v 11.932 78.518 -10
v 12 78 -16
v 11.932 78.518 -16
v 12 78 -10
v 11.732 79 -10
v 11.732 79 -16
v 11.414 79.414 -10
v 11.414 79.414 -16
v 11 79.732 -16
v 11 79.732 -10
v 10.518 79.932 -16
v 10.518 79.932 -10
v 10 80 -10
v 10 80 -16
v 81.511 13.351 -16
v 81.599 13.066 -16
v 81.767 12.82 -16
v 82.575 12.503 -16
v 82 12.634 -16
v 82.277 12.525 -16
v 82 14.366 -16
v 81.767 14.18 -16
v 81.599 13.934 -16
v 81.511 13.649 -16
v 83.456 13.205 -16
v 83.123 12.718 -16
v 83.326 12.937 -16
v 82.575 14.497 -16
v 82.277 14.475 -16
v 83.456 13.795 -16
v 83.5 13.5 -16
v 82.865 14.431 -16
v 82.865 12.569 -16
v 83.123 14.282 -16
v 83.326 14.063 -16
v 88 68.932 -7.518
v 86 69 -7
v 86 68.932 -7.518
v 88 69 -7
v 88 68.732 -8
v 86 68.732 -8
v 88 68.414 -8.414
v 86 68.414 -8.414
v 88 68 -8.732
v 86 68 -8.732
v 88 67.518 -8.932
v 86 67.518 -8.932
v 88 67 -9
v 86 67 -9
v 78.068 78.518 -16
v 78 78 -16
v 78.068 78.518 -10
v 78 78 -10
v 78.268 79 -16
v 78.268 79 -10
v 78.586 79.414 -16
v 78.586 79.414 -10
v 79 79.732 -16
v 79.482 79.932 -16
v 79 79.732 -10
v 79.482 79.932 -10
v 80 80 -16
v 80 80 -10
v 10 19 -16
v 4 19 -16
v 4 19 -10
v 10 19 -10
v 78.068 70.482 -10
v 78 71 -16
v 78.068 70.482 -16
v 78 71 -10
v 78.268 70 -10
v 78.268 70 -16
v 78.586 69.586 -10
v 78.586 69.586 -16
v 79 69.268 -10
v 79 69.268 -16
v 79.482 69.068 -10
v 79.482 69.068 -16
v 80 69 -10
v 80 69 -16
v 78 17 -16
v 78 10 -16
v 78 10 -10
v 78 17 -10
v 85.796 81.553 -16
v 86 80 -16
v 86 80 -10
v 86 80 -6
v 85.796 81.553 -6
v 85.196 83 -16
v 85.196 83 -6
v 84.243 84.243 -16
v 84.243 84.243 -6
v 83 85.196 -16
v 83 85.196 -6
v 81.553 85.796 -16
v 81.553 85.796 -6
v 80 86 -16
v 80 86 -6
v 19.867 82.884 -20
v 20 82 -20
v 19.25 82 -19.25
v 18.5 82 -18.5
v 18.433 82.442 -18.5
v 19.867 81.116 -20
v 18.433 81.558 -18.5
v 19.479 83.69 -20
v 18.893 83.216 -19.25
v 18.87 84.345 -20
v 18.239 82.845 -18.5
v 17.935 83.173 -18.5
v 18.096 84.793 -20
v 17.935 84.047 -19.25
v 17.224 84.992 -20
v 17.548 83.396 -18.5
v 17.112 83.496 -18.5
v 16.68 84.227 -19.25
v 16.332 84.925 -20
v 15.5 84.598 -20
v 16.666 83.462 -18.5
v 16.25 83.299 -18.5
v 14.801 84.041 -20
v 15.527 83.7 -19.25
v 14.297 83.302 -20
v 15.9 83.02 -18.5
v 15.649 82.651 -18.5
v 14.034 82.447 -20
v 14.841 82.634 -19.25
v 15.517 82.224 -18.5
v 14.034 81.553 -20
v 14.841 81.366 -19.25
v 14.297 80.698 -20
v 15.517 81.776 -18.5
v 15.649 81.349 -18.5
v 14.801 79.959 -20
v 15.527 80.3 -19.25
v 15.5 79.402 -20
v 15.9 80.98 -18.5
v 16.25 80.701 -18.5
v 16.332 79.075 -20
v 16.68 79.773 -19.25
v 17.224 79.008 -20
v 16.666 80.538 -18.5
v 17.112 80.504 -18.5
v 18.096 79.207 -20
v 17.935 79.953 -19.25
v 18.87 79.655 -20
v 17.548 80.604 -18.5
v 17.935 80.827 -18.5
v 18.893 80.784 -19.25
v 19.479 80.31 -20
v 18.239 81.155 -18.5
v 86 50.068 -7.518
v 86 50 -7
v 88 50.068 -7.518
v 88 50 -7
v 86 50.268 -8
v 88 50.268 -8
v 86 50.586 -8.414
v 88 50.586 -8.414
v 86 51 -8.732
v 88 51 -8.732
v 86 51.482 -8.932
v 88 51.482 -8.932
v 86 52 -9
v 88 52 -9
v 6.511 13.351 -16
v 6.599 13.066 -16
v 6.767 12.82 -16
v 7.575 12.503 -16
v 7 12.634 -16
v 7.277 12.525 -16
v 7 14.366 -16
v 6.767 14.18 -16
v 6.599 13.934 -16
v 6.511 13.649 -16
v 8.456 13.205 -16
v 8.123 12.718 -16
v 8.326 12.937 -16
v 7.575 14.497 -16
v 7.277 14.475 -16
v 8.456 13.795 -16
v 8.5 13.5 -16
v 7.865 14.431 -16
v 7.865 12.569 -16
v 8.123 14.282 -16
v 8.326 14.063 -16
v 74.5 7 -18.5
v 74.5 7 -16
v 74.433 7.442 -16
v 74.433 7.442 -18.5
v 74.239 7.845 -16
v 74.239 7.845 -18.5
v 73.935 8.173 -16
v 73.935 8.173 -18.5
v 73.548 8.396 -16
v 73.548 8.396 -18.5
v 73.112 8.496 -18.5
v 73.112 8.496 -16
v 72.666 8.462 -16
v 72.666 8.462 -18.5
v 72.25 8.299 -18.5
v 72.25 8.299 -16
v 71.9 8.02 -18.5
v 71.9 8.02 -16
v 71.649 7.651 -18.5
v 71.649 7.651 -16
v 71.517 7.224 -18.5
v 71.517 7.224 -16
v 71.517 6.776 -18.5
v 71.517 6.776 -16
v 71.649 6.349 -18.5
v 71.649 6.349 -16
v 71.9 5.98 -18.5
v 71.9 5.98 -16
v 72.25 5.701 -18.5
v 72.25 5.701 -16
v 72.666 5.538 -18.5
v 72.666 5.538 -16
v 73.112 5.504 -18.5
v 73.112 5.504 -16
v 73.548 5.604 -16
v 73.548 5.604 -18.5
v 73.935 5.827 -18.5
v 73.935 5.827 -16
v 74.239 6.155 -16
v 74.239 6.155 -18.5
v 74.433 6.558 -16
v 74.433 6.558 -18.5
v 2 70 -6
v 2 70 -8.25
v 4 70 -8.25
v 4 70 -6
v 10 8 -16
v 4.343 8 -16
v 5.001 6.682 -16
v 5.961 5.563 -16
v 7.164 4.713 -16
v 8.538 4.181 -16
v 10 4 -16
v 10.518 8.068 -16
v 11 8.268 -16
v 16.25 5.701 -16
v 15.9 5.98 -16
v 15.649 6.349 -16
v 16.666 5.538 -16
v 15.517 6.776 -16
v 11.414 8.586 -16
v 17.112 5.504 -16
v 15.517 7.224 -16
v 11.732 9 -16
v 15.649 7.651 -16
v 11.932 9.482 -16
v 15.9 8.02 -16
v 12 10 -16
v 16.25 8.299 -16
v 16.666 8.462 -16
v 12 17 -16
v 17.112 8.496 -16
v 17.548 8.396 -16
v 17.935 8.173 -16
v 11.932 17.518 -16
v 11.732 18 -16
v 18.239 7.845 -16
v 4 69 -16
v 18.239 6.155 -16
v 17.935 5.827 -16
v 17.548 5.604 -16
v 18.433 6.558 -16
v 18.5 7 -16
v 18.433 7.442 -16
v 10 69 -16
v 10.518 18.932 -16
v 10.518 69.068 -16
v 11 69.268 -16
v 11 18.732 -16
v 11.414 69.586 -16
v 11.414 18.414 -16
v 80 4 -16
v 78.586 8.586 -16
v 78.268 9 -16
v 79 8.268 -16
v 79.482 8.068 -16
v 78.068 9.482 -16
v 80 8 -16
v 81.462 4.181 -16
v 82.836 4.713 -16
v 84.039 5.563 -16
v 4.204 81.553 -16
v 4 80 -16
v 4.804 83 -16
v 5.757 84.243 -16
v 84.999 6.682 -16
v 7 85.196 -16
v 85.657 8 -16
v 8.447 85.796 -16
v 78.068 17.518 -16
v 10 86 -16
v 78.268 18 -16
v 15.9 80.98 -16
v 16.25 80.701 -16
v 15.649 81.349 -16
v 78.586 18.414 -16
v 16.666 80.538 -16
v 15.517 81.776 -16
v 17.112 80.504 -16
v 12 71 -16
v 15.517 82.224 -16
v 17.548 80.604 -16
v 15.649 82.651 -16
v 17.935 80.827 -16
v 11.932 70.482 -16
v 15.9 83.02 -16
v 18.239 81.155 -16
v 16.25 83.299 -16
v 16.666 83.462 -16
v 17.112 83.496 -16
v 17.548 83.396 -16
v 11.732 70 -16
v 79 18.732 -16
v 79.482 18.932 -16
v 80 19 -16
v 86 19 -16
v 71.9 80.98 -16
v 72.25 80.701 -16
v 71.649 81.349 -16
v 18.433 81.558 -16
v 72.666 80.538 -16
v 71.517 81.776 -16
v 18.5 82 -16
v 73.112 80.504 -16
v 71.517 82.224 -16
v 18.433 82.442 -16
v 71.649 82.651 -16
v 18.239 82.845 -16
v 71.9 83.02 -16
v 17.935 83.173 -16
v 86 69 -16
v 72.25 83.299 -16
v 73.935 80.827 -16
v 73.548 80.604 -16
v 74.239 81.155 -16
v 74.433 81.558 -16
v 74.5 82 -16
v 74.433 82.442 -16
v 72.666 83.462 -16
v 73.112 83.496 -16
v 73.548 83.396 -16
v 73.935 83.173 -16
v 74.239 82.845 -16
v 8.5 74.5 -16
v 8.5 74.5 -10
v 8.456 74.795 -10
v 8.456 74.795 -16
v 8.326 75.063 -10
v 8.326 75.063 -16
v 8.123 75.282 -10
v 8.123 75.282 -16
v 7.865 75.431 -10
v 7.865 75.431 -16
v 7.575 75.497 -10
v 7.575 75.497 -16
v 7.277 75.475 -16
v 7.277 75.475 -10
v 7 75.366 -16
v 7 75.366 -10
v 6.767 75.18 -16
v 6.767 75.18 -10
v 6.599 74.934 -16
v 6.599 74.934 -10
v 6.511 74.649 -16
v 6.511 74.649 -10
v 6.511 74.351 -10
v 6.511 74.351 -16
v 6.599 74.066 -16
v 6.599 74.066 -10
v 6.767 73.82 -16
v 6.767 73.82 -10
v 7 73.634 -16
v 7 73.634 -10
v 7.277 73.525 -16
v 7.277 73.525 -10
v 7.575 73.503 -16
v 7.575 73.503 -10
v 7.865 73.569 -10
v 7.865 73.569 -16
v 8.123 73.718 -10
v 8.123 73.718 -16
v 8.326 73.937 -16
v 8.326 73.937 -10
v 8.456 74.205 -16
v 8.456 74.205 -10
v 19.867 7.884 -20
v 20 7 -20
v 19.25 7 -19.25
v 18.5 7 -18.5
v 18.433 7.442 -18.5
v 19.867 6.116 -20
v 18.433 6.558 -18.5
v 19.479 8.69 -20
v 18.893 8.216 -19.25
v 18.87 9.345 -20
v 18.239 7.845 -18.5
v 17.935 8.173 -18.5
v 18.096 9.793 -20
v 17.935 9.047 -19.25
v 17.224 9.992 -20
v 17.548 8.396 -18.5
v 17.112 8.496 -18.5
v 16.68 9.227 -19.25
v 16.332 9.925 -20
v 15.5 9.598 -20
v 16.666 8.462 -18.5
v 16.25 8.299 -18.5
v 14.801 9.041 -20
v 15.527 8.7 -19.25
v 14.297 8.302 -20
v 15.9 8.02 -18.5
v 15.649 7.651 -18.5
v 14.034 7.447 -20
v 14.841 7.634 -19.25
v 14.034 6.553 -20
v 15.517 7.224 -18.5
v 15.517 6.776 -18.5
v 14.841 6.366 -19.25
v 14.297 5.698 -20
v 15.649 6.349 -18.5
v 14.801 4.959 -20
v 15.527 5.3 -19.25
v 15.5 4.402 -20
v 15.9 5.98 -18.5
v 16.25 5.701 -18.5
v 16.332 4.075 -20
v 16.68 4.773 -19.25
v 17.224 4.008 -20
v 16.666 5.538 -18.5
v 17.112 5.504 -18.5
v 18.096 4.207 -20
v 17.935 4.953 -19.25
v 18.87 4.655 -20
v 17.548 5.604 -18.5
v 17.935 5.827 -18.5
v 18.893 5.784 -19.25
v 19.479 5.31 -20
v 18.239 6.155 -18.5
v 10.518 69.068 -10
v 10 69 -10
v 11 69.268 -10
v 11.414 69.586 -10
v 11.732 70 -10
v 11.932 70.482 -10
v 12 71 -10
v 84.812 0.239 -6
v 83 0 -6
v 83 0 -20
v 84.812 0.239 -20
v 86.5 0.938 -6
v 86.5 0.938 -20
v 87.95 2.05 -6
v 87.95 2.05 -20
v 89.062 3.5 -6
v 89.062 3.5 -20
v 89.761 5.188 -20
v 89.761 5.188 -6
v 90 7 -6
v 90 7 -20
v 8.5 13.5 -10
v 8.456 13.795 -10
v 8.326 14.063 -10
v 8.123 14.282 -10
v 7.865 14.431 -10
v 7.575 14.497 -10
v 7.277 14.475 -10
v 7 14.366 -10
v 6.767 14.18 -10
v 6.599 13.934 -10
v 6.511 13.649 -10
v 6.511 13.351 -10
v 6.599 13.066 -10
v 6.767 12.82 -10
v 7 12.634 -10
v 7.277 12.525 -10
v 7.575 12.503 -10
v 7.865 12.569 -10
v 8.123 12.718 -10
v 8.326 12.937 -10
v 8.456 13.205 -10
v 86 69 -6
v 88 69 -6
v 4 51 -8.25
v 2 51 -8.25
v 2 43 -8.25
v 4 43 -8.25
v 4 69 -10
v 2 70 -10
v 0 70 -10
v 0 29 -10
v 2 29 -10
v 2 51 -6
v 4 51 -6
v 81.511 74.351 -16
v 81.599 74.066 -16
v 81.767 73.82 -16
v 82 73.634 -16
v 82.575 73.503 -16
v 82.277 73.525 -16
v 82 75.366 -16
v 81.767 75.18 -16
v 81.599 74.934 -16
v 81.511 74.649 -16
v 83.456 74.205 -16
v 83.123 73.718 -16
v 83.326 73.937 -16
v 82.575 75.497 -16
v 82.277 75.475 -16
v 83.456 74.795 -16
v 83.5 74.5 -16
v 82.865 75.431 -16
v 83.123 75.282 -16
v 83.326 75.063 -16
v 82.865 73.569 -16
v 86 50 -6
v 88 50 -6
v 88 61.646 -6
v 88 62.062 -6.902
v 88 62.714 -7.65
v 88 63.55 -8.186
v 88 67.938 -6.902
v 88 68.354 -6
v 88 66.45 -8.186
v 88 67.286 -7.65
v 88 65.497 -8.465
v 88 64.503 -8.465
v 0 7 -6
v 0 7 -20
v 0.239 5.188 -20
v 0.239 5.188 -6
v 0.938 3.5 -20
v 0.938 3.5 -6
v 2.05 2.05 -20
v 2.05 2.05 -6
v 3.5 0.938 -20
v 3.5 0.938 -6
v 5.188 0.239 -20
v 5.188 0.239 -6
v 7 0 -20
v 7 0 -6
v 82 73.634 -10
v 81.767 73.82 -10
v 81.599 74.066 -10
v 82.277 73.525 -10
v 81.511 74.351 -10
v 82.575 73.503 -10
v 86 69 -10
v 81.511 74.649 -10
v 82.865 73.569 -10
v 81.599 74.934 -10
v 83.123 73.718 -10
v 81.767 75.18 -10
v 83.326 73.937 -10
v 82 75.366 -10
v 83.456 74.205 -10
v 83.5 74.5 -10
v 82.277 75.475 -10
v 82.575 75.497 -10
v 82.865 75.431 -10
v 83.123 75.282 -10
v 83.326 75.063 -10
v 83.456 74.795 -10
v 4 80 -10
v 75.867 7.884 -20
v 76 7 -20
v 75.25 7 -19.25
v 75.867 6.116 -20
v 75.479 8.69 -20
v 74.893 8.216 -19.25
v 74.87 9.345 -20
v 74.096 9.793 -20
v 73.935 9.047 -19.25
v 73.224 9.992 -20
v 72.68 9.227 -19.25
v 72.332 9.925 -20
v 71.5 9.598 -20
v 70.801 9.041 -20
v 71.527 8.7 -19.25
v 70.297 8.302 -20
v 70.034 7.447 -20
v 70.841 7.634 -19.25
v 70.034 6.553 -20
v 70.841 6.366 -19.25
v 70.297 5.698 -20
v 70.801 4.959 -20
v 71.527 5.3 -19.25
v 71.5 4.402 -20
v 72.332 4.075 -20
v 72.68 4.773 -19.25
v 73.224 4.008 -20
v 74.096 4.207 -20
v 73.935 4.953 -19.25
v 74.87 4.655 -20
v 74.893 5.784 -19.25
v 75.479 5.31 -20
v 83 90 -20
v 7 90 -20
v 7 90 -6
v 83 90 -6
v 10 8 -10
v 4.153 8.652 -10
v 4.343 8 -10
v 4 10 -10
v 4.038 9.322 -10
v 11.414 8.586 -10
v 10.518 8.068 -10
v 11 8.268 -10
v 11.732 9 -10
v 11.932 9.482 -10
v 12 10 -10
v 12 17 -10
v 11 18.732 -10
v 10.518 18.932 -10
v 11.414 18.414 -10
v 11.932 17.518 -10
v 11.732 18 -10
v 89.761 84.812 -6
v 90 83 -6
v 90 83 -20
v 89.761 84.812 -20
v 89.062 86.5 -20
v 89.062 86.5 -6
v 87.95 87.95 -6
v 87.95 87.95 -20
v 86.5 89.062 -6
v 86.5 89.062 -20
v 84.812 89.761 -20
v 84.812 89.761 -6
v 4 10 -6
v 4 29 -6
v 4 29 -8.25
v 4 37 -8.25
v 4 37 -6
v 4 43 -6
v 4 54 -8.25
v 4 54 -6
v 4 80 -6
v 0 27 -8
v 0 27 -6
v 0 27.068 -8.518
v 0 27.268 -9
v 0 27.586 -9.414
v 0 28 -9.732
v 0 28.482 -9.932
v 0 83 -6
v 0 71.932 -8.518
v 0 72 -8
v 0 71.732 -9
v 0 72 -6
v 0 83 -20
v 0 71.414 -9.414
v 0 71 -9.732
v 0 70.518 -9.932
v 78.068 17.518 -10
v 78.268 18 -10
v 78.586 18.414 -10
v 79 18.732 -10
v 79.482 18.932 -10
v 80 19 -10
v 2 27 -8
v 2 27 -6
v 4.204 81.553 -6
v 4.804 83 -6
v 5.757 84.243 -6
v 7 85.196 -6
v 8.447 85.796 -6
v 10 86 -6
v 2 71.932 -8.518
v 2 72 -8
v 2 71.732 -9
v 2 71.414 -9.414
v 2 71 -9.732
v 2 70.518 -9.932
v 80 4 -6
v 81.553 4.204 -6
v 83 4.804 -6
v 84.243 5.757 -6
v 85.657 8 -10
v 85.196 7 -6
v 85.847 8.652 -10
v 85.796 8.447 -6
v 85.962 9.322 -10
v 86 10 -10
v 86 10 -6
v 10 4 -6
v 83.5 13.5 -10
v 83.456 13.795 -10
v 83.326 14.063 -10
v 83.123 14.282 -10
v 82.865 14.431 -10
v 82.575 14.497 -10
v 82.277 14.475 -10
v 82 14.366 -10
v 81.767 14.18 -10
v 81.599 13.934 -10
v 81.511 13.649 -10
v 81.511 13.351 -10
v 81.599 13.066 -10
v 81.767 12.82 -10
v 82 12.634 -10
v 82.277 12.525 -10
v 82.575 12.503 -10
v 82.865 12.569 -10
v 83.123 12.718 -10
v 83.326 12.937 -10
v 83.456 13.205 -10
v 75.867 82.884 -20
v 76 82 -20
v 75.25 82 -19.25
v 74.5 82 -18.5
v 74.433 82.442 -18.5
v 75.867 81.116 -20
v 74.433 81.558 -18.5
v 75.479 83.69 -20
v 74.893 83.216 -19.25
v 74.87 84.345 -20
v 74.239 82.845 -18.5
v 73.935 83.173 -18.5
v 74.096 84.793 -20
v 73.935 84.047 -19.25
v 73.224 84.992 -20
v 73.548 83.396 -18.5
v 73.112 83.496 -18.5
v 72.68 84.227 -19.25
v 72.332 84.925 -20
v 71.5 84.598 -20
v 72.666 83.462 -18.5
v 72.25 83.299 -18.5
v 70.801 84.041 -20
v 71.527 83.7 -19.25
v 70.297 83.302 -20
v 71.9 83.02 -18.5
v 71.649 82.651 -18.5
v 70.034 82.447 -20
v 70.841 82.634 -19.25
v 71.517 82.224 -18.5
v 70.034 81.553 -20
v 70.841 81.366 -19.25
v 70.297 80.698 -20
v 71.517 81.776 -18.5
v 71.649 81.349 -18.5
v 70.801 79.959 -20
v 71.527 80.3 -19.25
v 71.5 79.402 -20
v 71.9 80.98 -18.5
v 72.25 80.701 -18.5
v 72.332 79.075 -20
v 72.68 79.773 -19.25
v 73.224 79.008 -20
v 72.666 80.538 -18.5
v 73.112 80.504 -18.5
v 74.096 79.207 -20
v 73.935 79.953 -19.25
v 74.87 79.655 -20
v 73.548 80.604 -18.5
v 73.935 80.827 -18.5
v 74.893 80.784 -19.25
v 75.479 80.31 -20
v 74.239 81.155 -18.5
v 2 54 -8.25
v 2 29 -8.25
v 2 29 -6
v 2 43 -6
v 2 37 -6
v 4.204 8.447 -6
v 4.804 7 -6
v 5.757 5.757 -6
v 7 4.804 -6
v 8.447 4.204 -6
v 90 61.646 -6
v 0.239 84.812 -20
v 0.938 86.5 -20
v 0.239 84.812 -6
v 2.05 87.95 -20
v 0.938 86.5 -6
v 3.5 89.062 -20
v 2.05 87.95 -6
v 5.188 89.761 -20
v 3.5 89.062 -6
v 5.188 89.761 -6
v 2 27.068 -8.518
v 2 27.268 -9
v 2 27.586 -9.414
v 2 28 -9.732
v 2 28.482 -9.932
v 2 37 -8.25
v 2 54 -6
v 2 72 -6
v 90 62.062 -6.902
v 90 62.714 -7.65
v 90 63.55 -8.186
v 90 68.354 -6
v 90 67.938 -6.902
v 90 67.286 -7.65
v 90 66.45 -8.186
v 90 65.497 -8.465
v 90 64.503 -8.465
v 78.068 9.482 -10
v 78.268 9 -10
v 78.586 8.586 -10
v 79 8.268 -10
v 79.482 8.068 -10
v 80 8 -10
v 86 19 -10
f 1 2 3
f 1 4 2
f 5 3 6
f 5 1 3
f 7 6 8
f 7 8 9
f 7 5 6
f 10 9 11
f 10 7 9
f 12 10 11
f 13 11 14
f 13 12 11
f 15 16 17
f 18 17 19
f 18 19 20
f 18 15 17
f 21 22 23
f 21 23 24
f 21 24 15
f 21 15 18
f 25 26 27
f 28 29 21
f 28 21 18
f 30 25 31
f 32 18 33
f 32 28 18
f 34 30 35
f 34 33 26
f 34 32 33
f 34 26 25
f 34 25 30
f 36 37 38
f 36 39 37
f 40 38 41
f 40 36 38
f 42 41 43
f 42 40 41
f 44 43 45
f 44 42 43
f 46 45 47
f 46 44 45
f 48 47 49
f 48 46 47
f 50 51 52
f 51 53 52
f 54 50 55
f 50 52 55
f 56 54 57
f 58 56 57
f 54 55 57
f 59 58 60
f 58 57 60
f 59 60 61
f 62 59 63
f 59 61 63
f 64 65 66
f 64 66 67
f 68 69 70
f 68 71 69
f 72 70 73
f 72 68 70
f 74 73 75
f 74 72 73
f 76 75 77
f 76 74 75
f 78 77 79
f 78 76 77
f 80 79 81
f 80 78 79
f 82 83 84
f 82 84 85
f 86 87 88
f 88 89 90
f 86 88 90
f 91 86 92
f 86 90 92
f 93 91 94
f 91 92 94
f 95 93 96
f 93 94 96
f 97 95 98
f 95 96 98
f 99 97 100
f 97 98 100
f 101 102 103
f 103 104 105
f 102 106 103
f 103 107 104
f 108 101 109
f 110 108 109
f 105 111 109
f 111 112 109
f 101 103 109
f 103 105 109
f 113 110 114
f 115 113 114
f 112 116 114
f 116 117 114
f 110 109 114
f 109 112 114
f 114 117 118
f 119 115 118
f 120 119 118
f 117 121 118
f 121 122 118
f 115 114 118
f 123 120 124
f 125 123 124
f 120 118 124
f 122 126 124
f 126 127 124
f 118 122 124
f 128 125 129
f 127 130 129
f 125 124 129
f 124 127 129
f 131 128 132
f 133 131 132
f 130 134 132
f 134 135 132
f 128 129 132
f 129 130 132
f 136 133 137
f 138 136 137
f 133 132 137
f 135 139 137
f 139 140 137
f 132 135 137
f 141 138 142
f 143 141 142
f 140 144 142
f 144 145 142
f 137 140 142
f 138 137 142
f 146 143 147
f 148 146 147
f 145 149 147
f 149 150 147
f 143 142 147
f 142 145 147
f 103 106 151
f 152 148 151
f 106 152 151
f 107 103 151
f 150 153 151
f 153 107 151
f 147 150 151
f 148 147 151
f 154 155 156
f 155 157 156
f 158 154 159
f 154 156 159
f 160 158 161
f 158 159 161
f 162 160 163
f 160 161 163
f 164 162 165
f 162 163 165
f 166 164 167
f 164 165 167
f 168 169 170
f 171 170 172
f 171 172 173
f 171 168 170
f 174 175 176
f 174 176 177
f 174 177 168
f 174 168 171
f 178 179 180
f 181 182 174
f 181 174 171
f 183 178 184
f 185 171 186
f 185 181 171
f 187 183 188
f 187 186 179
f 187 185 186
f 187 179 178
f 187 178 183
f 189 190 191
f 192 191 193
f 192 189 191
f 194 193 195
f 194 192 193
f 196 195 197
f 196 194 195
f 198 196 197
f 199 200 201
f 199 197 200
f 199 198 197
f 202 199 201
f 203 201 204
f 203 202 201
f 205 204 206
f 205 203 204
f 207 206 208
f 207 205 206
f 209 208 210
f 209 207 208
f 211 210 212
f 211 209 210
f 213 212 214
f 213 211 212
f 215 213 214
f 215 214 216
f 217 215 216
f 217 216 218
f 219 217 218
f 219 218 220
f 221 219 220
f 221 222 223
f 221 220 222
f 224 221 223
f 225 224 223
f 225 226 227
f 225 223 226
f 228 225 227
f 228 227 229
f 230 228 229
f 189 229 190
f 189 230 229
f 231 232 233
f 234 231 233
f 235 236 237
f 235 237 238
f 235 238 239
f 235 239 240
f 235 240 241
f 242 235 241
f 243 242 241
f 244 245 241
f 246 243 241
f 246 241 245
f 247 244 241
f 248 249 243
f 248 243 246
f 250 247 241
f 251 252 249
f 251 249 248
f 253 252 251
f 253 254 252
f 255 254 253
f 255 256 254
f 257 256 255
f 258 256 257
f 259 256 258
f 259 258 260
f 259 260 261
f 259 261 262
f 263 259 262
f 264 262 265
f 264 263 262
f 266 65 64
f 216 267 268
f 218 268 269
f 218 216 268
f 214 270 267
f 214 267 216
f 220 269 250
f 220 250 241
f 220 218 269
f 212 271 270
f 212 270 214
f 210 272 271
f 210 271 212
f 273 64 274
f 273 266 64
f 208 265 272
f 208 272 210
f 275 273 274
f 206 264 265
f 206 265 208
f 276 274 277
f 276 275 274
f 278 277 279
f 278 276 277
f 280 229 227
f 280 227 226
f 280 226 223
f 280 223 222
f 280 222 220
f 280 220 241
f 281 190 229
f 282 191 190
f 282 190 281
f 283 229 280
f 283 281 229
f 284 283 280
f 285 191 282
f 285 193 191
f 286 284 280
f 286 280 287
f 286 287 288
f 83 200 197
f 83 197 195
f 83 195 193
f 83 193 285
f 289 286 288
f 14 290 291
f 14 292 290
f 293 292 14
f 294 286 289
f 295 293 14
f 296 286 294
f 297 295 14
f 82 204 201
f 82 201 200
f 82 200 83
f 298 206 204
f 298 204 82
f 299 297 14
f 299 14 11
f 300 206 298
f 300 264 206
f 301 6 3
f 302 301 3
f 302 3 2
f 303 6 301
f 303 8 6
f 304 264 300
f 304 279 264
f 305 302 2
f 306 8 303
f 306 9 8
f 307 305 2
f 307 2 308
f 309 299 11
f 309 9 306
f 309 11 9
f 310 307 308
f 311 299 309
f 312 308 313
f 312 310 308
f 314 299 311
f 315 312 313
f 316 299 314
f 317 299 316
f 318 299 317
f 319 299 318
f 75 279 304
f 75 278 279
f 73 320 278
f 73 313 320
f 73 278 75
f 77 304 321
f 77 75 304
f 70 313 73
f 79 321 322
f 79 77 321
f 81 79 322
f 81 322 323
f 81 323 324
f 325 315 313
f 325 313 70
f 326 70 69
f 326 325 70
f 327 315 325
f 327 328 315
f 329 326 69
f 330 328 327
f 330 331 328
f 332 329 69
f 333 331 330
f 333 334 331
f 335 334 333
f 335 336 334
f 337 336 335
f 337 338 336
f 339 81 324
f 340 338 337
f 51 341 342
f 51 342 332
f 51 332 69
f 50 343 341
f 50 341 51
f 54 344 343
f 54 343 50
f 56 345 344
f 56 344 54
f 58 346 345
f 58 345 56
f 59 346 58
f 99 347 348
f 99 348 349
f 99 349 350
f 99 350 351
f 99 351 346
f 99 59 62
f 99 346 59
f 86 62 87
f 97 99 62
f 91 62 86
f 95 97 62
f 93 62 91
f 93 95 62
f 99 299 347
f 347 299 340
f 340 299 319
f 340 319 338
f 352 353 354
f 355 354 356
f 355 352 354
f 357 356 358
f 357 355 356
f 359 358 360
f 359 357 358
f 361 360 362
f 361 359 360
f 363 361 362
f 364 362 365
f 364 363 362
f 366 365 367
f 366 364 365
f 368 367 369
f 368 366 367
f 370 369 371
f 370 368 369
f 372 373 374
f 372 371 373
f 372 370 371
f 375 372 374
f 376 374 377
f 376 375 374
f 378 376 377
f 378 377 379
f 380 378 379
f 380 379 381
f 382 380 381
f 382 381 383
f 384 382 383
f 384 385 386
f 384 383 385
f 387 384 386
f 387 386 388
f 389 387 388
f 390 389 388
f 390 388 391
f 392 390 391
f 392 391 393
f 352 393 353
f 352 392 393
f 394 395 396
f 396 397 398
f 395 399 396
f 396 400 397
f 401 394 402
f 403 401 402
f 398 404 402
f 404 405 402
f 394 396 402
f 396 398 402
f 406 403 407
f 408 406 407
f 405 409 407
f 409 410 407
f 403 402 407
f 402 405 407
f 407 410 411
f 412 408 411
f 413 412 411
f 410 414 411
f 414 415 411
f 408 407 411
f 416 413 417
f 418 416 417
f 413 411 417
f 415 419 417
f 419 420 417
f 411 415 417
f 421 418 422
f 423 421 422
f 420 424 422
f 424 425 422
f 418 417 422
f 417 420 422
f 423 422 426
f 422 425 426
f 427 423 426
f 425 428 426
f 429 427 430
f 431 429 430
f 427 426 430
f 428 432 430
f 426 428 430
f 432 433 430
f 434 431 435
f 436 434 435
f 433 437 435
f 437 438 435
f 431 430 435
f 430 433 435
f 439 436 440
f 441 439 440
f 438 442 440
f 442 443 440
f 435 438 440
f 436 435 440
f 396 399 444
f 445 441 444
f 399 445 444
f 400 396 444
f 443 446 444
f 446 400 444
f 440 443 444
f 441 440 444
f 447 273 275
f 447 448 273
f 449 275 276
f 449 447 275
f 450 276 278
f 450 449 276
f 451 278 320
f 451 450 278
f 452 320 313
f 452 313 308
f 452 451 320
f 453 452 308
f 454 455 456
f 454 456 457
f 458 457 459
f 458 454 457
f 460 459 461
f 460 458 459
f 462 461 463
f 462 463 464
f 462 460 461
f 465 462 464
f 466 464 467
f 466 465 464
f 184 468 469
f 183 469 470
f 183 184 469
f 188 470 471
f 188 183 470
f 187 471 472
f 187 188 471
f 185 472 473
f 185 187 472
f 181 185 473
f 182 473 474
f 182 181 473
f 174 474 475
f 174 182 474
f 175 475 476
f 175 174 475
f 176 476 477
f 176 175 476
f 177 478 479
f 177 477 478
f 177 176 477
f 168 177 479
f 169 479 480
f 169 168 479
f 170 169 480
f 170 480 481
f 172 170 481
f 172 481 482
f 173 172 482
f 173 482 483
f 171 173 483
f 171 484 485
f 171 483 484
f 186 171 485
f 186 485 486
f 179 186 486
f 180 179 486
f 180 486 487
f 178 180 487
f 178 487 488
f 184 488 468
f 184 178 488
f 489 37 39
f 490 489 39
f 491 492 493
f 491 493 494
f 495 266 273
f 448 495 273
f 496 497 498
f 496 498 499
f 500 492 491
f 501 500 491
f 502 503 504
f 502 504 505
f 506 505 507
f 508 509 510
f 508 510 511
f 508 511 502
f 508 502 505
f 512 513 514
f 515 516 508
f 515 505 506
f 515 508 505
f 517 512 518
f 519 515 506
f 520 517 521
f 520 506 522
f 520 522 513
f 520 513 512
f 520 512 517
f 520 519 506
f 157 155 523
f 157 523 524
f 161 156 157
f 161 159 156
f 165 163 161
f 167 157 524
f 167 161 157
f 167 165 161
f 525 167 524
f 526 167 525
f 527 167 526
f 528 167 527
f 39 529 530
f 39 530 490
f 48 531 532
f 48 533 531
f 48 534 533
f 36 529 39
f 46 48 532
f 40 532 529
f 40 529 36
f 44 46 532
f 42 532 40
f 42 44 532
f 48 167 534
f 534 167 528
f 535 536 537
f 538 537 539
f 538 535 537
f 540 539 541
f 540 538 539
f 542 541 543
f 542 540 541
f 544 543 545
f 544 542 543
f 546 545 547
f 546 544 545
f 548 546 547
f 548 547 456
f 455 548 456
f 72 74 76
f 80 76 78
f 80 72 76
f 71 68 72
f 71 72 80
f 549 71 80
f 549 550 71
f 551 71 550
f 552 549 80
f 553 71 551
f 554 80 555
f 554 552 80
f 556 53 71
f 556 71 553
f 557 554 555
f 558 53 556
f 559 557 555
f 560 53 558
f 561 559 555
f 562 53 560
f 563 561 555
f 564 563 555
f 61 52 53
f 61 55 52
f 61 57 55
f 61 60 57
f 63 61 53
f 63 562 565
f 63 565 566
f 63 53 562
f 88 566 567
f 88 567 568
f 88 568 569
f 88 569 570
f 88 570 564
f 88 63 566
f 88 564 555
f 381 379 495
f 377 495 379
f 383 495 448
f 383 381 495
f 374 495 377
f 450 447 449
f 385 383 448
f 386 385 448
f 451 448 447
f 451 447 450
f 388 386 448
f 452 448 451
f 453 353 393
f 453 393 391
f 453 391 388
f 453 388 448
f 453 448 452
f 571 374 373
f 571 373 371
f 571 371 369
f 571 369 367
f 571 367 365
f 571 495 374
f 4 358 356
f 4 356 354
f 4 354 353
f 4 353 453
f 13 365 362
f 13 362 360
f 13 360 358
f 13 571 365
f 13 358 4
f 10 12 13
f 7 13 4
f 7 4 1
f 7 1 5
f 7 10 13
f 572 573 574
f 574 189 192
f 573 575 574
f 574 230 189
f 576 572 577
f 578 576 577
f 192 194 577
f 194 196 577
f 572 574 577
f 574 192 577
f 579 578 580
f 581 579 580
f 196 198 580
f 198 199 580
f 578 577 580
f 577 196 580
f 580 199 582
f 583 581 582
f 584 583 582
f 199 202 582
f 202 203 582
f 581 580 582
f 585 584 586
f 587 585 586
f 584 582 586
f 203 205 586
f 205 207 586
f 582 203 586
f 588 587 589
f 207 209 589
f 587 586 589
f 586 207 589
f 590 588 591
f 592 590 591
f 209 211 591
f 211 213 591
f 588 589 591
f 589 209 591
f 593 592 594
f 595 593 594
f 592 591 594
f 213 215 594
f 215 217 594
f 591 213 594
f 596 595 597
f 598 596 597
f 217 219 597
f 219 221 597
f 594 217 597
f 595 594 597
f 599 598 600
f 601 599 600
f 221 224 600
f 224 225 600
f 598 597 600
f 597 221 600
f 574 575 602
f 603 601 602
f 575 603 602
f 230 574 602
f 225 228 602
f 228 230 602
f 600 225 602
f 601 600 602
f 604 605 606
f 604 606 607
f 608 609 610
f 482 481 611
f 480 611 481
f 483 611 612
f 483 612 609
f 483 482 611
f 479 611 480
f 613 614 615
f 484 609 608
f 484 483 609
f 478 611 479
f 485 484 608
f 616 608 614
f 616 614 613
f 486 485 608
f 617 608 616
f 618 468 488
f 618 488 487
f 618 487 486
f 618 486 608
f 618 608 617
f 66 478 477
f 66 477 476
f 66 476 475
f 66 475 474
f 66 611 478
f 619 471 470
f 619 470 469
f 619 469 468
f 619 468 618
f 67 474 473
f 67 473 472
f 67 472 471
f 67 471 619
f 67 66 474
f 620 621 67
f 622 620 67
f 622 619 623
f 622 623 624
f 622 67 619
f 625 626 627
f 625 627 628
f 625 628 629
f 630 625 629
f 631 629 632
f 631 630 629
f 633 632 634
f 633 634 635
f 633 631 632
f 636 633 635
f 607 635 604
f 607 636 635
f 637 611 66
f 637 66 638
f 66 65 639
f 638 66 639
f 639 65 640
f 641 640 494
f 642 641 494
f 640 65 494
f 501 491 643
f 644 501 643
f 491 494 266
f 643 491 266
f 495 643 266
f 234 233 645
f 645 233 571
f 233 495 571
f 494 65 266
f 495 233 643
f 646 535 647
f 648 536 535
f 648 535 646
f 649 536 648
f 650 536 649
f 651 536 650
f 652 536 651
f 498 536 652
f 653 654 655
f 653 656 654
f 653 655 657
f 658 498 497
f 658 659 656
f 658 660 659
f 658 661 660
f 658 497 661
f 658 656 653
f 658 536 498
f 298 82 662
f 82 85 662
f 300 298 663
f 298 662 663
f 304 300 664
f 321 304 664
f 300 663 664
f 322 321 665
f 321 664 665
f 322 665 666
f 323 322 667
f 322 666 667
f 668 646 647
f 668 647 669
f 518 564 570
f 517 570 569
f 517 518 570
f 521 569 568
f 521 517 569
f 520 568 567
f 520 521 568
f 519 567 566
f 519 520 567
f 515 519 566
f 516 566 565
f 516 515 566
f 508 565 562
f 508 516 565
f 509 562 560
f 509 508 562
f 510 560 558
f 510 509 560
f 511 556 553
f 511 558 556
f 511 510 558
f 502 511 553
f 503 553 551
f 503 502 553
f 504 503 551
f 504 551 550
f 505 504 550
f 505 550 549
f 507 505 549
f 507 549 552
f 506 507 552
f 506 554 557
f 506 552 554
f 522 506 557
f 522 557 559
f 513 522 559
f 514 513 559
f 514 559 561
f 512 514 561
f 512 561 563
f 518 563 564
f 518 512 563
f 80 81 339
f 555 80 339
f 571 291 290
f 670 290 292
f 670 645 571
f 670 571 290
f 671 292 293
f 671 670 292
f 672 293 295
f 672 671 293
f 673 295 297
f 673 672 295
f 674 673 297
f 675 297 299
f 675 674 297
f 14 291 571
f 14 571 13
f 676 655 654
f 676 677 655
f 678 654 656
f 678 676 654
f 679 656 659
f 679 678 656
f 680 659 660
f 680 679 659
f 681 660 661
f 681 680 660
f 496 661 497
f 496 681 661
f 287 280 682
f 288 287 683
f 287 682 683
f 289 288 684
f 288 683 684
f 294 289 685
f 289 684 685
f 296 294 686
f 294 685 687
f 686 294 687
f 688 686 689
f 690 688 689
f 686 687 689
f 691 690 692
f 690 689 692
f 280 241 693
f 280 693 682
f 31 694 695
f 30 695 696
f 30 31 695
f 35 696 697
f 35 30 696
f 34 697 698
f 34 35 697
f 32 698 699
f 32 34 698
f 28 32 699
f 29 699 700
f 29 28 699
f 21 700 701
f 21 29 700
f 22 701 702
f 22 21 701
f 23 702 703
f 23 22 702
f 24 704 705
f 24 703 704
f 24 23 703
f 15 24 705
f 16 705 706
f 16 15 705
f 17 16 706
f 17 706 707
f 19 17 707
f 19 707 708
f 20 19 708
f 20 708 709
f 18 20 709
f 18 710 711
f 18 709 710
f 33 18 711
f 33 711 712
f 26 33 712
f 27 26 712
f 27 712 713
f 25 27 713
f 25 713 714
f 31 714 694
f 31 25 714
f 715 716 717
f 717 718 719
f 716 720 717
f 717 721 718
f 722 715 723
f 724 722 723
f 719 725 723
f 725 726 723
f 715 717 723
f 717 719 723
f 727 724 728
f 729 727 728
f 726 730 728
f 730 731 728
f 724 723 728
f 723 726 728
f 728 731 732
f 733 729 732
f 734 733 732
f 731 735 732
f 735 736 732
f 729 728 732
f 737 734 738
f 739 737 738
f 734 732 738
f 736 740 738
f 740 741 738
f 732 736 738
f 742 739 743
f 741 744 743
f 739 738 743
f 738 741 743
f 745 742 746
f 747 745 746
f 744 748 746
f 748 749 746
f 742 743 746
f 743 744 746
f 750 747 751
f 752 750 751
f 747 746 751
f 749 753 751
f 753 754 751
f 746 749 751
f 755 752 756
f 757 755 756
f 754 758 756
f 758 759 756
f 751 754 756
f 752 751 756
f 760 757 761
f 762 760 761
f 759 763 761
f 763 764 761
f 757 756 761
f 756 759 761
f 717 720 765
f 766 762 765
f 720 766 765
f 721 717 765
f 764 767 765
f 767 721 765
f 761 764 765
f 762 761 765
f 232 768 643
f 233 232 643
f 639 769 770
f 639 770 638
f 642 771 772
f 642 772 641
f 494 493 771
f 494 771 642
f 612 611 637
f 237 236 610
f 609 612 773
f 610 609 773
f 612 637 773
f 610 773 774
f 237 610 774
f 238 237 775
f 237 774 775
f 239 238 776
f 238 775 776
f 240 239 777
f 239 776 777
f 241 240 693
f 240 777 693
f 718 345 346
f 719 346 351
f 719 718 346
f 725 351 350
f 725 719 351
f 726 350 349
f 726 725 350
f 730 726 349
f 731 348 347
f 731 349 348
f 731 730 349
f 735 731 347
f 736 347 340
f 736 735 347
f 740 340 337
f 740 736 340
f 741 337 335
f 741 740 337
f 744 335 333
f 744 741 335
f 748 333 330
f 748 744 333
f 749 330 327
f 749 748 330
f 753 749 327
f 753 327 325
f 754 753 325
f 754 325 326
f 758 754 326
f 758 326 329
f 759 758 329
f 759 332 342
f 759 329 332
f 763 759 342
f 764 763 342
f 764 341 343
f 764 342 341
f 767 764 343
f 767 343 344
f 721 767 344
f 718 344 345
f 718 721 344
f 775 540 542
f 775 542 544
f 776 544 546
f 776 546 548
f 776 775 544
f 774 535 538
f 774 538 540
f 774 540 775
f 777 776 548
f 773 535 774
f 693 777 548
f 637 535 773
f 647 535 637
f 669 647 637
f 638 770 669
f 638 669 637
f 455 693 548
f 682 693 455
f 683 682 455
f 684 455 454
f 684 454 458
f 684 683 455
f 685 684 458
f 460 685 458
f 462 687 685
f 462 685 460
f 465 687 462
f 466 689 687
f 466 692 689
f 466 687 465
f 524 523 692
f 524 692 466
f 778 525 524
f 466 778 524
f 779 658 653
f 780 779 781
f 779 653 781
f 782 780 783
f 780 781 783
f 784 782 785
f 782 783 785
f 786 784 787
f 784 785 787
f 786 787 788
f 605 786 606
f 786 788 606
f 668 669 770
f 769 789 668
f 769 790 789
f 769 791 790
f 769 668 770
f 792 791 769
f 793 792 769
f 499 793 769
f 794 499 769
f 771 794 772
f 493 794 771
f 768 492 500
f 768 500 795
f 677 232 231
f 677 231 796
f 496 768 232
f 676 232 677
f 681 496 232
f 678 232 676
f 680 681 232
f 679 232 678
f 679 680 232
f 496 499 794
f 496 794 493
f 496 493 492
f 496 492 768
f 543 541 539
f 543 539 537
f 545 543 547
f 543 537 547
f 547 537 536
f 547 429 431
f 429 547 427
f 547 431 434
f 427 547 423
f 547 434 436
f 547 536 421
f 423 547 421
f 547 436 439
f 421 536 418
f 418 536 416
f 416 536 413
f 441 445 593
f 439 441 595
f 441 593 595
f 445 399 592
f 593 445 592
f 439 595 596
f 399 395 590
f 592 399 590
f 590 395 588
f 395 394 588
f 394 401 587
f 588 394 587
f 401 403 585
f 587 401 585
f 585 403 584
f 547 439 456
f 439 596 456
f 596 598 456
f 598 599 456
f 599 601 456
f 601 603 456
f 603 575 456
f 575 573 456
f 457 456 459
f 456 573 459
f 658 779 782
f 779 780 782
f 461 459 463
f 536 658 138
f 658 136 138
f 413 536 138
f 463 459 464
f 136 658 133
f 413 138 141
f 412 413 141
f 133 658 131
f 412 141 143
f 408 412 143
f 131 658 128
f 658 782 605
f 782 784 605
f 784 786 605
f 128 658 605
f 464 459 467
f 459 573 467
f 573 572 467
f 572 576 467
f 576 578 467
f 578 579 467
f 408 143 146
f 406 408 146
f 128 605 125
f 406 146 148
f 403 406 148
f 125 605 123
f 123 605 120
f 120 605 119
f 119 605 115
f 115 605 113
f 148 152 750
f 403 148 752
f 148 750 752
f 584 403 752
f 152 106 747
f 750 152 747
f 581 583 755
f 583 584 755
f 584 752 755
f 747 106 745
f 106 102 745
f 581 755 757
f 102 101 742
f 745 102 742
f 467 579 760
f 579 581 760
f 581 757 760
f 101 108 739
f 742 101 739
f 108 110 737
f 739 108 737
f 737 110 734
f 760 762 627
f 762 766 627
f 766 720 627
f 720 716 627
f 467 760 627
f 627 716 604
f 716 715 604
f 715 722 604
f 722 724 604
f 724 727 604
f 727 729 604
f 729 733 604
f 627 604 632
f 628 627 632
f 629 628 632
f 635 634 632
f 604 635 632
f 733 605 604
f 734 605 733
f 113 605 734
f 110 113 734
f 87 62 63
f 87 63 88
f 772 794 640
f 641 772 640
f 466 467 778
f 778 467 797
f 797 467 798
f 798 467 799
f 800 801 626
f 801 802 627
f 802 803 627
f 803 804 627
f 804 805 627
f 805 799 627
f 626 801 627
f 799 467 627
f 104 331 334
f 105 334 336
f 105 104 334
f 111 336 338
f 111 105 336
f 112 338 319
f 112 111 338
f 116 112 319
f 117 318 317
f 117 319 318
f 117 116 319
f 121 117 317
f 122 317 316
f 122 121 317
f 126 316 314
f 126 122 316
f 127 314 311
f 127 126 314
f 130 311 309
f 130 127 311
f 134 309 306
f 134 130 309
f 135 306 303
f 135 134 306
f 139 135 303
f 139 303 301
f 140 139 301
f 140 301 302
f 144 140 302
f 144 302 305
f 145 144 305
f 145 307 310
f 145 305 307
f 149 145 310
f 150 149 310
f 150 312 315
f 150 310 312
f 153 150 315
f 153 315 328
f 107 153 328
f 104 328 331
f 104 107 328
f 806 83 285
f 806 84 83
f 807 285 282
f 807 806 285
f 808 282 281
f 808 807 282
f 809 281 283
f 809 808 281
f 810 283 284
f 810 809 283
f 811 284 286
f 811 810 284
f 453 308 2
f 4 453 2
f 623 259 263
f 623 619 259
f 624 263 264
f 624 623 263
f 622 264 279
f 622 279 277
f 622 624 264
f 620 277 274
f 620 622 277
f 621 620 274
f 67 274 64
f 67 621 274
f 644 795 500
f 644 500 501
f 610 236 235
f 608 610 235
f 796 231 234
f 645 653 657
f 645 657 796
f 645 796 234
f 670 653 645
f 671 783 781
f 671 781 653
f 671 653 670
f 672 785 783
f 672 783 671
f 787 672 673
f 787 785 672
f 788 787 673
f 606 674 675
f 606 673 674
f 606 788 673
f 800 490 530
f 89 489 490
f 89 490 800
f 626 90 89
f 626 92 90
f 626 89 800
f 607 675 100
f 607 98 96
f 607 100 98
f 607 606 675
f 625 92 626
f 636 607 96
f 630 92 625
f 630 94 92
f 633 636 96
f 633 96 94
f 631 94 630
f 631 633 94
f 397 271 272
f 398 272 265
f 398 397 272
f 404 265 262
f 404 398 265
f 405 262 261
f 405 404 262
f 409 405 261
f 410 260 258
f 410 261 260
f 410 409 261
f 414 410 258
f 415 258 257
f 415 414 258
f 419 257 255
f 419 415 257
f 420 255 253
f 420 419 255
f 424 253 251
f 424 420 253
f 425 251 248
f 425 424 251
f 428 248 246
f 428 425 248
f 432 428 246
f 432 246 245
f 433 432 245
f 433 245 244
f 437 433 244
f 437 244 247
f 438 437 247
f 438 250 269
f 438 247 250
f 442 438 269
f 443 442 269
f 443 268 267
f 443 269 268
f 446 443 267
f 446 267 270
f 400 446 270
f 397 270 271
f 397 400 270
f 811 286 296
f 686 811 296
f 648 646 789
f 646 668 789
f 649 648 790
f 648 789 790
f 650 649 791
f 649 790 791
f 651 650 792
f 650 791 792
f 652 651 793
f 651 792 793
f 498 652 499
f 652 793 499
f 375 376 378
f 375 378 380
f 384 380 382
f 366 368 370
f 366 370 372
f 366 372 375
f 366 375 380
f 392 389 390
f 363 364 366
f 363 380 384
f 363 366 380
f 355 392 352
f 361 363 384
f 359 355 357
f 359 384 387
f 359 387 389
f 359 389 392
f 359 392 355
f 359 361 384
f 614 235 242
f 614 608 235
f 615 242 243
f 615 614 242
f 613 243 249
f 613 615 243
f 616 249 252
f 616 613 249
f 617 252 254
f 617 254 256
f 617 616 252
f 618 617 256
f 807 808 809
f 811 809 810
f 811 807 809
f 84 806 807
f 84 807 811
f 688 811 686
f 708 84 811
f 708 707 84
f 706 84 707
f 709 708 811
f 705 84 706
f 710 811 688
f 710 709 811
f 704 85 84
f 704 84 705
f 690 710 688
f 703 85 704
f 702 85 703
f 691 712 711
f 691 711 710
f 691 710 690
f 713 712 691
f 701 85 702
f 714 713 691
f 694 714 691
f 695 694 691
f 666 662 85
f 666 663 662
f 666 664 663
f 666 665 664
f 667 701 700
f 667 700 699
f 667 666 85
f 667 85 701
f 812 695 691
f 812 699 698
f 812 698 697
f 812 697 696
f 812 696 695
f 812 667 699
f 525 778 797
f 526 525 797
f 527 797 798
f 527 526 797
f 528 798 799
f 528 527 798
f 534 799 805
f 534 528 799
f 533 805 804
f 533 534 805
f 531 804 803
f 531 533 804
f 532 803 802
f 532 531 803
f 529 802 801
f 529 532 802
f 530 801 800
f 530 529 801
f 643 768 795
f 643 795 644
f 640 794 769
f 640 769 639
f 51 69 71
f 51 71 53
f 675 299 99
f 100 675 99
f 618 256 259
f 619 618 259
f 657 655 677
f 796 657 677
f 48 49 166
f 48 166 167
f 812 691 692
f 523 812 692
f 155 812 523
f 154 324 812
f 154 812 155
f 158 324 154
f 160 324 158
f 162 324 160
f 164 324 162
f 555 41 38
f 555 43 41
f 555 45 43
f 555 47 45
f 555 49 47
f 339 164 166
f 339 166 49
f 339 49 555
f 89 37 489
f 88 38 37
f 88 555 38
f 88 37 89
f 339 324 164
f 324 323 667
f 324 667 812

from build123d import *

# Parameters (mm, degrees)
CYLINDER005_R     = 1
CYLINDER005_DEPTH = 8
BOX014_W          = 8
BOX014_H          = 11
BOX014_DEPTH      = 6
FILLET006_R       = 2
CYLINDER006_R     = 1
CYLINDER006_DEPTH = 9
BOX013_W          = 8
BOX013_H          = 11
BOX013_DEPTH      = 6
FILLET005_R       = 2
CYLINDER004_R     = 1
CYLINDER004_DEPTH = 8
BOX011_W          = 8
BOX011_H          = 11
BOX011_DEPTH      = 6
FILLET004_R       = 2
CYLINDER003_R     = 1
CYLINDER003_DEPTH = 8
BOX009_W          = 8
BOX009_H          = 11
BOX009_DEPTH      = 6
FILLET003_R       = 2
BOX024_W          = 2
BOX024_H          = 45
BOX024_DEPTH      = 8
FILLET007_R       = 2
BOX023_W          = 6
BOX023_H          = 8
BOX023_DEPTH      = 3
CYLINDER008_R     = 1.5
CYLINDER008_DEPTH = 10
CYLINDER009_R     = 1.5
CYLINDER009_DEPTH = 10
CYLINDER010_R     = 1.5
CYLINDER010_DEPTH = 10
CYLINDER007_R     = 1.5
CYLINDER007_DEPTH = 10
BOX018_W          = 6
BOX018_H          = 8
BOX018_DEPTH      = 3
BOX015_W          = 16
BOX015_H          = 16
BOX015_DEPTH      = 2.25
CYLINDER002_R     = 3.5
CYLINDER002_DEPTH = 10.5
BOX010_W          = 2
BOX010_H          = 19
BOX010_DEPTH      = 8
FILLET002_R       = 2
BOX008_W          = 90
BOX008_H          = 90
BOX008_DEPTH      = 14
BOX006_W          = 82
BOX006_H          = 82
BOX006_DEPTH      = 82
FILLET001_R       = 6
BOX005_W          = 90
BOX005_H          = 90
BOX005_DEPTH      = 90
FILLET_R          = 7
CHAMFER_SIZE      = 1.5


with BuildPart() as cylinder002:
    # Cylinder005 → Cylinder005 (new body)
    with BuildSketch(Plane(origin=(82.5, 74.5, 4), x_dir=(1, 0, 0), z_dir=(0, 0, 1))):
        Circle(CYLINDER005_R)
    extrude(amount=CYLINDER005_DEPTH)


with BuildPart() as cut003:
    # Box014 → Box014 (new body)
    with BuildSketch(Plane(origin=(78, 8, 4), x_dir=(1, 0, 0), z_dir=(0, 0, 1))):
        with Locations((4, 5.5)):
            Rectangle(BOX014_W, BOX014_H)
    extrude(amount=BOX014_DEPTH)

    # Fillet006
    fillet006_edges = [cut003.edges().sort_by_distance(p)[0] for p in [
        (78, 8, 7),
        (78, 19, 7),
    ]]
    fillet(fillet006_edges, radius=FILLET006_R)


with BuildPart() as cut003_1:
    # Fillet006 placement: moved
    add(cut003.part.moved(Location((0, 61, 0))))

    # Cut003: cut Cylinder002
    add(cylinder002.part, mode=Mode.SUBTRACT)


with BuildPart() as cylinder003:
    # Cylinder006 → Cylinder006 (new body)
    with BuildSketch(Plane(origin=(82.5, 13.5, 4), x_dir=(1, 0, 0), z_dir=(0, 0, 1))):
        Circle(CYLINDER006_R)
    extrude(amount=CYLINDER006_DEPTH)


with BuildPart() as cut004:
    # Box013 → Box013 (new body)
    with BuildSketch(Plane(origin=(78, 8, 4), x_dir=(1, 0, 0), z_dir=(0, 0, 1))):
        with Locations((4, 5.5)):
            Rectangle(BOX013_W, BOX013_H)
    extrude(amount=BOX013_DEPTH)

    # Fillet005
    fillet005_edges = [cut004.edges().sort_by_distance(p)[0] for p in [
        (78, 8, 7),
        (78, 19, 7),
    ]]
    fillet(fillet005_edges, radius=FILLET005_R)

    # Cut004: cut Cylinder003
    add(cylinder003.part, mode=Mode.SUBTRACT)


with BuildPart() as cylinder001:
    # Cylinder004 → Cylinder004 (new body)
    with BuildSketch(Plane(origin=(7.5, 74.5, 4), x_dir=(1, 0, 0), z_dir=(0, 0, 1))):
        Circle(CYLINDER004_R)
    extrude(amount=CYLINDER004_DEPTH)


with BuildPart() as cut005:
    # Box011 → Box011 (new body)
    with BuildSketch(Plane(origin=(4, 8, 3), x_dir=(1, 0, 0), z_dir=(0, 0, 1))):
        with Locations((4, 5.5)):
            Rectangle(BOX011_W, BOX011_H)
    extrude(amount=BOX011_DEPTH)

    # Fillet004
    fillet004_edges = [cut005.edges().sort_by_distance(p)[0] for p in [
        (12, 8, 6),
        (12, 19, 6),
    ]]
    fillet(fillet004_edges, radius=FILLET004_R)


with BuildPart() as cut005_1:
    # Fillet004 placement: moved
    add(cut005.part.moved(Location((0, 61, 1))))

    # Cut005: cut Cylinder001
    add(cylinder001.part, mode=Mode.SUBTRACT)


with BuildPart() as cylinder:
    # Cylinder003 → Cylinder003 (new body)
    with BuildSketch(Plane(origin=(7.5, 13.5, 4), x_dir=(1, 0, 0), z_dir=(0, 0, 1))):
        Circle(CYLINDER003_R)
    extrude(amount=CYLINDER003_DEPTH)


with BuildPart() as cut006:
    # Box009 → Box009 (new body)
    with BuildSketch(Plane(origin=(4, 8, 3), x_dir=(1, 0, 0), z_dir=(0, 0, 1))):
        with Locations((4, 5.5)):
            Rectangle(BOX009_W, BOX009_H)
    extrude(amount=BOX009_DEPTH)

    # Fillet003
    fillet003_edges = [cut006.edges().sort_by_distance(p)[0] for p in [
        (12, 8, 6),
        (12, 19, 6),
    ]]
    fillet(fillet003_edges, radius=FILLET003_R)


with BuildPart() as cut006_1:
    # Fillet003 placement: moved
    add(cut006.part.moved(Location((0, 0, 1))))

    # Cut006: cut Cylinder
    add(cylinder.part, mode=Mode.SUBTRACT)


with BuildPart() as fillet007:
    # Box024 → Box024 (new body)
    with BuildSketch(Plane(origin=(0, 27, 10), x_dir=(1, 0, 0), z_dir=(0, 0, 1))):
        with Locations((1, 22.5)):
            Rectangle(BOX024_W, BOX024_H)
    extrude(amount=BOX024_DEPTH)

    # Fillet007
    fillet007_edges = [fillet007.edges().sort_by_distance(p)[0] for p in [
        (1, 27, 10),
        (1, 27, 18),
        (1, 72, 10),
        (1, 72, 18),
    ]]
    fillet(fillet007_edges, radius=FILLET007_R)


with BuildPart() as uart001:
    # Box023 → Box023 (new body)
    with BuildSketch(Plane(origin=(0, 43, 11.75), x_dir=(1, 0, 0), z_dir=(0, 0, 1))):
        with Locations((3, 4)):
            Rectangle(BOX023_W, BOX023_H)
    extrude(amount=BOX023_DEPTH)


with BuildPart() as cylinder005:
    # Cylinder008 → Cylinder008 (new body)
    with BuildSketch(Plane(origin=(17, 7, 0), x_dir=(1, 0, 0), z_dir=(0, 0, 1))):
        Circle(CYLINDER008_R)
    extrude(amount=CYLINDER008_DEPTH)


with BuildPart() as cylinder006:
    # Cylinder009 → Cylinder009 (new body)
    with BuildSketch(Plane(origin=(17, 82, 0), x_dir=(1, 0, 0), z_dir=(0, 0, 1))):
        Circle(CYLINDER009_R)
    extrude(amount=CYLINDER009_DEPTH)


with BuildPart() as cylinder007:
    # Cylinder010 → Cylinder010 (new body)
    with BuildSketch(Plane(origin=(73, 82, 0), x_dir=(1, 0, 0), z_dir=(0, 0, 1))):
        Circle(CYLINDER010_R)
    extrude(amount=CYLINDER010_DEPTH)


with BuildPart() as cylinder004:
    # Cylinder007 → Cylinder007 (new body)
    with BuildSketch(Plane(origin=(73, 7, 0), x_dir=(1, 0, 0), z_dir=(0, 0, 1))):
        Circle(CYLINDER007_R)
    extrude(amount=CYLINDER007_DEPTH)


with BuildPart() as power001:
    # Box018 → Box018 (new body)
    with BuildSketch(Plane(origin=(0, 29, 11.75), x_dir=(1, 0, 0), z_dir=(0, 0, 1))):
        with Locations((3, 4)):
            Rectangle(BOX018_W, BOX018_H)
    extrude(amount=BOX018_DEPTH)


with BuildPart() as sd001:
    # Box015 → Box015 (new body)
    with BuildSketch(Plane(origin=(0, 54, 11.75), x_dir=(1, 0, 0), z_dir=(0, 0, 1))):
        with Locations((8, 8)):
            Rectangle(BOX015_W, BOX015_H)
    extrude(amount=BOX015_DEPTH)


with BuildPart() as headphone001:
    # Cylinder002 → Cylinder002 (new body)
    with BuildSketch(Plane(origin=(80, 65, 15), x_dir=(0, 0, -1), z_dir=(1, 0, 0))):
        Circle(CYLINDER002_R)
    extrude(amount=CYLINDER002_DEPTH)


with BuildPart() as fillet002:
    # Box010 → Box010 (new body)
    with BuildSketch(Plane(origin=(86, 50, 11), x_dir=(1, 0, 0), z_dir=(0, 0, 1))):
        with Locations((1, 9.5)):
            Rectangle(BOX010_W, BOX010_H)
    extrude(amount=BOX010_DEPTH)

    # Fillet002
    fillet002_edges = [fillet002.edges().sort_by_distance(p)[0] for p in [
        (87, 50, 11),
        (87, 50, 19),
        (87, 69, 11),
        (87, 69, 19),
    ]]
    fillet(fillet002_edges, radius=FILLET002_R)


with BuildPart() as cube003:
    # Box008 → Box008 (new body)
    with BuildSketch(Plane.XY):
        with Locations((45, 45)):
            Rectangle(BOX008_W, BOX008_H)
    extrude(amount=BOX008_DEPTH)


with BuildPart() as fillet001:
    # Box006 → Box006 (new body)
    with BuildSketch(Plane.XY):
        with Locations((41, 41)):
            Rectangle(BOX006_W, BOX006_H)
    extrude(amount=BOX006_DEPTH)

    # Fillet001
    fillet001_edges = [fillet001.edges().sort_by_distance(p)[0] for p in [
        (0, 0, 41),
        (0, 41, 82),
        (0, 82, 41),
        (82, 0, 41),
        (82, 41, 82),
        (82, 82, 41),
        (41, 0, 82),
        (41, 82, 82),
    ]]
    fillet(fillet001_edges, radius=FILLET001_R)


with BuildPart() as fillet001_1:
    # Fillet001 placement: moved
    add(fillet001.part.moved(Location((4, 4, 4))))


with BuildPart() as bottom001:
    # Box005 → Box005 (new body)
    with BuildSketch(Plane.XY):
        with Locations((45, 45)):
            Rectangle(BOX005_W, BOX005_H)
    extrude(amount=BOX005_DEPTH)

    # Fillet
    fillet_edges = [bottom001.edges().sort_by_distance(p)[0] for p in [
        (0, 0, 45),
        (0, 45, 90),
        (0, 90, 45),
        (90, 0, 45),
        (90, 45, 90),
        (90, 90, 45),
        (45, 0, 90),
        (45, 90, 90),
    ]]
    fillet(fillet_edges, radius=FILLET_R)

    # Cut: cut Fillet001
    add(fillet001_1.part, mode=Mode.SUBTRACT)

    # Common: intersect Cube003
    add(cube003.part, mode=Mode.INTERSECT)

    # Cut001: cut Fillet002
    add(fillet002.part, mode=Mode.SUBTRACT)

    # Cut002: cut Headphone001
    add(headphone001.part, mode=Mode.SUBTRACT)

    # Cut007: cut sd001
    add(sd001.part, mode=Mode.SUBTRACT)

    # Cut008: cut power001
    add(power001.part, mode=Mode.SUBTRACT)

    # Cut009: cut Cylinder004
    add(cylinder004.part, mode=Mode.SUBTRACT)

    # Cut010: cut Cylinder007
    add(cylinder007.part, mode=Mode.SUBTRACT)

    # Cut011: cut Cylinder006
    add(cylinder006.part, mode=Mode.SUBTRACT)

    # Cut012: cut Cylinder005
    add(cylinder005.part, mode=Mode.SUBTRACT)

    # Cut013: cut uart001
    add(uart001.part, mode=Mode.SUBTRACT)

    # Cut014: cut Fillet007
    add(fillet007.part, mode=Mode.SUBTRACT)

    # Chamfer
    chamfer_edges = [bottom001.edges().sort_by_distance(p)[0] for p in [
        (15.5, 82, 0),
        (15.5, 7, 0),
        (71.5, 7, 0),
        (71.5, 82, 0),
    ]]
    chamfer(chamfer_edges, length=CHAMFER_SIZE)

    # Fusion: union Cut003, Cut004, Cut005, Cut006
    add(cut003_1.part)
    add(cut004.part)
    add(cut005_1.part)
    add(cut006_1.part)


with BuildPart() as bottom001_1:
    # Fusion placement: moved
    add(bottom001.part.moved(Location((0, 0, -20))))


solid = bottom001_1.part
